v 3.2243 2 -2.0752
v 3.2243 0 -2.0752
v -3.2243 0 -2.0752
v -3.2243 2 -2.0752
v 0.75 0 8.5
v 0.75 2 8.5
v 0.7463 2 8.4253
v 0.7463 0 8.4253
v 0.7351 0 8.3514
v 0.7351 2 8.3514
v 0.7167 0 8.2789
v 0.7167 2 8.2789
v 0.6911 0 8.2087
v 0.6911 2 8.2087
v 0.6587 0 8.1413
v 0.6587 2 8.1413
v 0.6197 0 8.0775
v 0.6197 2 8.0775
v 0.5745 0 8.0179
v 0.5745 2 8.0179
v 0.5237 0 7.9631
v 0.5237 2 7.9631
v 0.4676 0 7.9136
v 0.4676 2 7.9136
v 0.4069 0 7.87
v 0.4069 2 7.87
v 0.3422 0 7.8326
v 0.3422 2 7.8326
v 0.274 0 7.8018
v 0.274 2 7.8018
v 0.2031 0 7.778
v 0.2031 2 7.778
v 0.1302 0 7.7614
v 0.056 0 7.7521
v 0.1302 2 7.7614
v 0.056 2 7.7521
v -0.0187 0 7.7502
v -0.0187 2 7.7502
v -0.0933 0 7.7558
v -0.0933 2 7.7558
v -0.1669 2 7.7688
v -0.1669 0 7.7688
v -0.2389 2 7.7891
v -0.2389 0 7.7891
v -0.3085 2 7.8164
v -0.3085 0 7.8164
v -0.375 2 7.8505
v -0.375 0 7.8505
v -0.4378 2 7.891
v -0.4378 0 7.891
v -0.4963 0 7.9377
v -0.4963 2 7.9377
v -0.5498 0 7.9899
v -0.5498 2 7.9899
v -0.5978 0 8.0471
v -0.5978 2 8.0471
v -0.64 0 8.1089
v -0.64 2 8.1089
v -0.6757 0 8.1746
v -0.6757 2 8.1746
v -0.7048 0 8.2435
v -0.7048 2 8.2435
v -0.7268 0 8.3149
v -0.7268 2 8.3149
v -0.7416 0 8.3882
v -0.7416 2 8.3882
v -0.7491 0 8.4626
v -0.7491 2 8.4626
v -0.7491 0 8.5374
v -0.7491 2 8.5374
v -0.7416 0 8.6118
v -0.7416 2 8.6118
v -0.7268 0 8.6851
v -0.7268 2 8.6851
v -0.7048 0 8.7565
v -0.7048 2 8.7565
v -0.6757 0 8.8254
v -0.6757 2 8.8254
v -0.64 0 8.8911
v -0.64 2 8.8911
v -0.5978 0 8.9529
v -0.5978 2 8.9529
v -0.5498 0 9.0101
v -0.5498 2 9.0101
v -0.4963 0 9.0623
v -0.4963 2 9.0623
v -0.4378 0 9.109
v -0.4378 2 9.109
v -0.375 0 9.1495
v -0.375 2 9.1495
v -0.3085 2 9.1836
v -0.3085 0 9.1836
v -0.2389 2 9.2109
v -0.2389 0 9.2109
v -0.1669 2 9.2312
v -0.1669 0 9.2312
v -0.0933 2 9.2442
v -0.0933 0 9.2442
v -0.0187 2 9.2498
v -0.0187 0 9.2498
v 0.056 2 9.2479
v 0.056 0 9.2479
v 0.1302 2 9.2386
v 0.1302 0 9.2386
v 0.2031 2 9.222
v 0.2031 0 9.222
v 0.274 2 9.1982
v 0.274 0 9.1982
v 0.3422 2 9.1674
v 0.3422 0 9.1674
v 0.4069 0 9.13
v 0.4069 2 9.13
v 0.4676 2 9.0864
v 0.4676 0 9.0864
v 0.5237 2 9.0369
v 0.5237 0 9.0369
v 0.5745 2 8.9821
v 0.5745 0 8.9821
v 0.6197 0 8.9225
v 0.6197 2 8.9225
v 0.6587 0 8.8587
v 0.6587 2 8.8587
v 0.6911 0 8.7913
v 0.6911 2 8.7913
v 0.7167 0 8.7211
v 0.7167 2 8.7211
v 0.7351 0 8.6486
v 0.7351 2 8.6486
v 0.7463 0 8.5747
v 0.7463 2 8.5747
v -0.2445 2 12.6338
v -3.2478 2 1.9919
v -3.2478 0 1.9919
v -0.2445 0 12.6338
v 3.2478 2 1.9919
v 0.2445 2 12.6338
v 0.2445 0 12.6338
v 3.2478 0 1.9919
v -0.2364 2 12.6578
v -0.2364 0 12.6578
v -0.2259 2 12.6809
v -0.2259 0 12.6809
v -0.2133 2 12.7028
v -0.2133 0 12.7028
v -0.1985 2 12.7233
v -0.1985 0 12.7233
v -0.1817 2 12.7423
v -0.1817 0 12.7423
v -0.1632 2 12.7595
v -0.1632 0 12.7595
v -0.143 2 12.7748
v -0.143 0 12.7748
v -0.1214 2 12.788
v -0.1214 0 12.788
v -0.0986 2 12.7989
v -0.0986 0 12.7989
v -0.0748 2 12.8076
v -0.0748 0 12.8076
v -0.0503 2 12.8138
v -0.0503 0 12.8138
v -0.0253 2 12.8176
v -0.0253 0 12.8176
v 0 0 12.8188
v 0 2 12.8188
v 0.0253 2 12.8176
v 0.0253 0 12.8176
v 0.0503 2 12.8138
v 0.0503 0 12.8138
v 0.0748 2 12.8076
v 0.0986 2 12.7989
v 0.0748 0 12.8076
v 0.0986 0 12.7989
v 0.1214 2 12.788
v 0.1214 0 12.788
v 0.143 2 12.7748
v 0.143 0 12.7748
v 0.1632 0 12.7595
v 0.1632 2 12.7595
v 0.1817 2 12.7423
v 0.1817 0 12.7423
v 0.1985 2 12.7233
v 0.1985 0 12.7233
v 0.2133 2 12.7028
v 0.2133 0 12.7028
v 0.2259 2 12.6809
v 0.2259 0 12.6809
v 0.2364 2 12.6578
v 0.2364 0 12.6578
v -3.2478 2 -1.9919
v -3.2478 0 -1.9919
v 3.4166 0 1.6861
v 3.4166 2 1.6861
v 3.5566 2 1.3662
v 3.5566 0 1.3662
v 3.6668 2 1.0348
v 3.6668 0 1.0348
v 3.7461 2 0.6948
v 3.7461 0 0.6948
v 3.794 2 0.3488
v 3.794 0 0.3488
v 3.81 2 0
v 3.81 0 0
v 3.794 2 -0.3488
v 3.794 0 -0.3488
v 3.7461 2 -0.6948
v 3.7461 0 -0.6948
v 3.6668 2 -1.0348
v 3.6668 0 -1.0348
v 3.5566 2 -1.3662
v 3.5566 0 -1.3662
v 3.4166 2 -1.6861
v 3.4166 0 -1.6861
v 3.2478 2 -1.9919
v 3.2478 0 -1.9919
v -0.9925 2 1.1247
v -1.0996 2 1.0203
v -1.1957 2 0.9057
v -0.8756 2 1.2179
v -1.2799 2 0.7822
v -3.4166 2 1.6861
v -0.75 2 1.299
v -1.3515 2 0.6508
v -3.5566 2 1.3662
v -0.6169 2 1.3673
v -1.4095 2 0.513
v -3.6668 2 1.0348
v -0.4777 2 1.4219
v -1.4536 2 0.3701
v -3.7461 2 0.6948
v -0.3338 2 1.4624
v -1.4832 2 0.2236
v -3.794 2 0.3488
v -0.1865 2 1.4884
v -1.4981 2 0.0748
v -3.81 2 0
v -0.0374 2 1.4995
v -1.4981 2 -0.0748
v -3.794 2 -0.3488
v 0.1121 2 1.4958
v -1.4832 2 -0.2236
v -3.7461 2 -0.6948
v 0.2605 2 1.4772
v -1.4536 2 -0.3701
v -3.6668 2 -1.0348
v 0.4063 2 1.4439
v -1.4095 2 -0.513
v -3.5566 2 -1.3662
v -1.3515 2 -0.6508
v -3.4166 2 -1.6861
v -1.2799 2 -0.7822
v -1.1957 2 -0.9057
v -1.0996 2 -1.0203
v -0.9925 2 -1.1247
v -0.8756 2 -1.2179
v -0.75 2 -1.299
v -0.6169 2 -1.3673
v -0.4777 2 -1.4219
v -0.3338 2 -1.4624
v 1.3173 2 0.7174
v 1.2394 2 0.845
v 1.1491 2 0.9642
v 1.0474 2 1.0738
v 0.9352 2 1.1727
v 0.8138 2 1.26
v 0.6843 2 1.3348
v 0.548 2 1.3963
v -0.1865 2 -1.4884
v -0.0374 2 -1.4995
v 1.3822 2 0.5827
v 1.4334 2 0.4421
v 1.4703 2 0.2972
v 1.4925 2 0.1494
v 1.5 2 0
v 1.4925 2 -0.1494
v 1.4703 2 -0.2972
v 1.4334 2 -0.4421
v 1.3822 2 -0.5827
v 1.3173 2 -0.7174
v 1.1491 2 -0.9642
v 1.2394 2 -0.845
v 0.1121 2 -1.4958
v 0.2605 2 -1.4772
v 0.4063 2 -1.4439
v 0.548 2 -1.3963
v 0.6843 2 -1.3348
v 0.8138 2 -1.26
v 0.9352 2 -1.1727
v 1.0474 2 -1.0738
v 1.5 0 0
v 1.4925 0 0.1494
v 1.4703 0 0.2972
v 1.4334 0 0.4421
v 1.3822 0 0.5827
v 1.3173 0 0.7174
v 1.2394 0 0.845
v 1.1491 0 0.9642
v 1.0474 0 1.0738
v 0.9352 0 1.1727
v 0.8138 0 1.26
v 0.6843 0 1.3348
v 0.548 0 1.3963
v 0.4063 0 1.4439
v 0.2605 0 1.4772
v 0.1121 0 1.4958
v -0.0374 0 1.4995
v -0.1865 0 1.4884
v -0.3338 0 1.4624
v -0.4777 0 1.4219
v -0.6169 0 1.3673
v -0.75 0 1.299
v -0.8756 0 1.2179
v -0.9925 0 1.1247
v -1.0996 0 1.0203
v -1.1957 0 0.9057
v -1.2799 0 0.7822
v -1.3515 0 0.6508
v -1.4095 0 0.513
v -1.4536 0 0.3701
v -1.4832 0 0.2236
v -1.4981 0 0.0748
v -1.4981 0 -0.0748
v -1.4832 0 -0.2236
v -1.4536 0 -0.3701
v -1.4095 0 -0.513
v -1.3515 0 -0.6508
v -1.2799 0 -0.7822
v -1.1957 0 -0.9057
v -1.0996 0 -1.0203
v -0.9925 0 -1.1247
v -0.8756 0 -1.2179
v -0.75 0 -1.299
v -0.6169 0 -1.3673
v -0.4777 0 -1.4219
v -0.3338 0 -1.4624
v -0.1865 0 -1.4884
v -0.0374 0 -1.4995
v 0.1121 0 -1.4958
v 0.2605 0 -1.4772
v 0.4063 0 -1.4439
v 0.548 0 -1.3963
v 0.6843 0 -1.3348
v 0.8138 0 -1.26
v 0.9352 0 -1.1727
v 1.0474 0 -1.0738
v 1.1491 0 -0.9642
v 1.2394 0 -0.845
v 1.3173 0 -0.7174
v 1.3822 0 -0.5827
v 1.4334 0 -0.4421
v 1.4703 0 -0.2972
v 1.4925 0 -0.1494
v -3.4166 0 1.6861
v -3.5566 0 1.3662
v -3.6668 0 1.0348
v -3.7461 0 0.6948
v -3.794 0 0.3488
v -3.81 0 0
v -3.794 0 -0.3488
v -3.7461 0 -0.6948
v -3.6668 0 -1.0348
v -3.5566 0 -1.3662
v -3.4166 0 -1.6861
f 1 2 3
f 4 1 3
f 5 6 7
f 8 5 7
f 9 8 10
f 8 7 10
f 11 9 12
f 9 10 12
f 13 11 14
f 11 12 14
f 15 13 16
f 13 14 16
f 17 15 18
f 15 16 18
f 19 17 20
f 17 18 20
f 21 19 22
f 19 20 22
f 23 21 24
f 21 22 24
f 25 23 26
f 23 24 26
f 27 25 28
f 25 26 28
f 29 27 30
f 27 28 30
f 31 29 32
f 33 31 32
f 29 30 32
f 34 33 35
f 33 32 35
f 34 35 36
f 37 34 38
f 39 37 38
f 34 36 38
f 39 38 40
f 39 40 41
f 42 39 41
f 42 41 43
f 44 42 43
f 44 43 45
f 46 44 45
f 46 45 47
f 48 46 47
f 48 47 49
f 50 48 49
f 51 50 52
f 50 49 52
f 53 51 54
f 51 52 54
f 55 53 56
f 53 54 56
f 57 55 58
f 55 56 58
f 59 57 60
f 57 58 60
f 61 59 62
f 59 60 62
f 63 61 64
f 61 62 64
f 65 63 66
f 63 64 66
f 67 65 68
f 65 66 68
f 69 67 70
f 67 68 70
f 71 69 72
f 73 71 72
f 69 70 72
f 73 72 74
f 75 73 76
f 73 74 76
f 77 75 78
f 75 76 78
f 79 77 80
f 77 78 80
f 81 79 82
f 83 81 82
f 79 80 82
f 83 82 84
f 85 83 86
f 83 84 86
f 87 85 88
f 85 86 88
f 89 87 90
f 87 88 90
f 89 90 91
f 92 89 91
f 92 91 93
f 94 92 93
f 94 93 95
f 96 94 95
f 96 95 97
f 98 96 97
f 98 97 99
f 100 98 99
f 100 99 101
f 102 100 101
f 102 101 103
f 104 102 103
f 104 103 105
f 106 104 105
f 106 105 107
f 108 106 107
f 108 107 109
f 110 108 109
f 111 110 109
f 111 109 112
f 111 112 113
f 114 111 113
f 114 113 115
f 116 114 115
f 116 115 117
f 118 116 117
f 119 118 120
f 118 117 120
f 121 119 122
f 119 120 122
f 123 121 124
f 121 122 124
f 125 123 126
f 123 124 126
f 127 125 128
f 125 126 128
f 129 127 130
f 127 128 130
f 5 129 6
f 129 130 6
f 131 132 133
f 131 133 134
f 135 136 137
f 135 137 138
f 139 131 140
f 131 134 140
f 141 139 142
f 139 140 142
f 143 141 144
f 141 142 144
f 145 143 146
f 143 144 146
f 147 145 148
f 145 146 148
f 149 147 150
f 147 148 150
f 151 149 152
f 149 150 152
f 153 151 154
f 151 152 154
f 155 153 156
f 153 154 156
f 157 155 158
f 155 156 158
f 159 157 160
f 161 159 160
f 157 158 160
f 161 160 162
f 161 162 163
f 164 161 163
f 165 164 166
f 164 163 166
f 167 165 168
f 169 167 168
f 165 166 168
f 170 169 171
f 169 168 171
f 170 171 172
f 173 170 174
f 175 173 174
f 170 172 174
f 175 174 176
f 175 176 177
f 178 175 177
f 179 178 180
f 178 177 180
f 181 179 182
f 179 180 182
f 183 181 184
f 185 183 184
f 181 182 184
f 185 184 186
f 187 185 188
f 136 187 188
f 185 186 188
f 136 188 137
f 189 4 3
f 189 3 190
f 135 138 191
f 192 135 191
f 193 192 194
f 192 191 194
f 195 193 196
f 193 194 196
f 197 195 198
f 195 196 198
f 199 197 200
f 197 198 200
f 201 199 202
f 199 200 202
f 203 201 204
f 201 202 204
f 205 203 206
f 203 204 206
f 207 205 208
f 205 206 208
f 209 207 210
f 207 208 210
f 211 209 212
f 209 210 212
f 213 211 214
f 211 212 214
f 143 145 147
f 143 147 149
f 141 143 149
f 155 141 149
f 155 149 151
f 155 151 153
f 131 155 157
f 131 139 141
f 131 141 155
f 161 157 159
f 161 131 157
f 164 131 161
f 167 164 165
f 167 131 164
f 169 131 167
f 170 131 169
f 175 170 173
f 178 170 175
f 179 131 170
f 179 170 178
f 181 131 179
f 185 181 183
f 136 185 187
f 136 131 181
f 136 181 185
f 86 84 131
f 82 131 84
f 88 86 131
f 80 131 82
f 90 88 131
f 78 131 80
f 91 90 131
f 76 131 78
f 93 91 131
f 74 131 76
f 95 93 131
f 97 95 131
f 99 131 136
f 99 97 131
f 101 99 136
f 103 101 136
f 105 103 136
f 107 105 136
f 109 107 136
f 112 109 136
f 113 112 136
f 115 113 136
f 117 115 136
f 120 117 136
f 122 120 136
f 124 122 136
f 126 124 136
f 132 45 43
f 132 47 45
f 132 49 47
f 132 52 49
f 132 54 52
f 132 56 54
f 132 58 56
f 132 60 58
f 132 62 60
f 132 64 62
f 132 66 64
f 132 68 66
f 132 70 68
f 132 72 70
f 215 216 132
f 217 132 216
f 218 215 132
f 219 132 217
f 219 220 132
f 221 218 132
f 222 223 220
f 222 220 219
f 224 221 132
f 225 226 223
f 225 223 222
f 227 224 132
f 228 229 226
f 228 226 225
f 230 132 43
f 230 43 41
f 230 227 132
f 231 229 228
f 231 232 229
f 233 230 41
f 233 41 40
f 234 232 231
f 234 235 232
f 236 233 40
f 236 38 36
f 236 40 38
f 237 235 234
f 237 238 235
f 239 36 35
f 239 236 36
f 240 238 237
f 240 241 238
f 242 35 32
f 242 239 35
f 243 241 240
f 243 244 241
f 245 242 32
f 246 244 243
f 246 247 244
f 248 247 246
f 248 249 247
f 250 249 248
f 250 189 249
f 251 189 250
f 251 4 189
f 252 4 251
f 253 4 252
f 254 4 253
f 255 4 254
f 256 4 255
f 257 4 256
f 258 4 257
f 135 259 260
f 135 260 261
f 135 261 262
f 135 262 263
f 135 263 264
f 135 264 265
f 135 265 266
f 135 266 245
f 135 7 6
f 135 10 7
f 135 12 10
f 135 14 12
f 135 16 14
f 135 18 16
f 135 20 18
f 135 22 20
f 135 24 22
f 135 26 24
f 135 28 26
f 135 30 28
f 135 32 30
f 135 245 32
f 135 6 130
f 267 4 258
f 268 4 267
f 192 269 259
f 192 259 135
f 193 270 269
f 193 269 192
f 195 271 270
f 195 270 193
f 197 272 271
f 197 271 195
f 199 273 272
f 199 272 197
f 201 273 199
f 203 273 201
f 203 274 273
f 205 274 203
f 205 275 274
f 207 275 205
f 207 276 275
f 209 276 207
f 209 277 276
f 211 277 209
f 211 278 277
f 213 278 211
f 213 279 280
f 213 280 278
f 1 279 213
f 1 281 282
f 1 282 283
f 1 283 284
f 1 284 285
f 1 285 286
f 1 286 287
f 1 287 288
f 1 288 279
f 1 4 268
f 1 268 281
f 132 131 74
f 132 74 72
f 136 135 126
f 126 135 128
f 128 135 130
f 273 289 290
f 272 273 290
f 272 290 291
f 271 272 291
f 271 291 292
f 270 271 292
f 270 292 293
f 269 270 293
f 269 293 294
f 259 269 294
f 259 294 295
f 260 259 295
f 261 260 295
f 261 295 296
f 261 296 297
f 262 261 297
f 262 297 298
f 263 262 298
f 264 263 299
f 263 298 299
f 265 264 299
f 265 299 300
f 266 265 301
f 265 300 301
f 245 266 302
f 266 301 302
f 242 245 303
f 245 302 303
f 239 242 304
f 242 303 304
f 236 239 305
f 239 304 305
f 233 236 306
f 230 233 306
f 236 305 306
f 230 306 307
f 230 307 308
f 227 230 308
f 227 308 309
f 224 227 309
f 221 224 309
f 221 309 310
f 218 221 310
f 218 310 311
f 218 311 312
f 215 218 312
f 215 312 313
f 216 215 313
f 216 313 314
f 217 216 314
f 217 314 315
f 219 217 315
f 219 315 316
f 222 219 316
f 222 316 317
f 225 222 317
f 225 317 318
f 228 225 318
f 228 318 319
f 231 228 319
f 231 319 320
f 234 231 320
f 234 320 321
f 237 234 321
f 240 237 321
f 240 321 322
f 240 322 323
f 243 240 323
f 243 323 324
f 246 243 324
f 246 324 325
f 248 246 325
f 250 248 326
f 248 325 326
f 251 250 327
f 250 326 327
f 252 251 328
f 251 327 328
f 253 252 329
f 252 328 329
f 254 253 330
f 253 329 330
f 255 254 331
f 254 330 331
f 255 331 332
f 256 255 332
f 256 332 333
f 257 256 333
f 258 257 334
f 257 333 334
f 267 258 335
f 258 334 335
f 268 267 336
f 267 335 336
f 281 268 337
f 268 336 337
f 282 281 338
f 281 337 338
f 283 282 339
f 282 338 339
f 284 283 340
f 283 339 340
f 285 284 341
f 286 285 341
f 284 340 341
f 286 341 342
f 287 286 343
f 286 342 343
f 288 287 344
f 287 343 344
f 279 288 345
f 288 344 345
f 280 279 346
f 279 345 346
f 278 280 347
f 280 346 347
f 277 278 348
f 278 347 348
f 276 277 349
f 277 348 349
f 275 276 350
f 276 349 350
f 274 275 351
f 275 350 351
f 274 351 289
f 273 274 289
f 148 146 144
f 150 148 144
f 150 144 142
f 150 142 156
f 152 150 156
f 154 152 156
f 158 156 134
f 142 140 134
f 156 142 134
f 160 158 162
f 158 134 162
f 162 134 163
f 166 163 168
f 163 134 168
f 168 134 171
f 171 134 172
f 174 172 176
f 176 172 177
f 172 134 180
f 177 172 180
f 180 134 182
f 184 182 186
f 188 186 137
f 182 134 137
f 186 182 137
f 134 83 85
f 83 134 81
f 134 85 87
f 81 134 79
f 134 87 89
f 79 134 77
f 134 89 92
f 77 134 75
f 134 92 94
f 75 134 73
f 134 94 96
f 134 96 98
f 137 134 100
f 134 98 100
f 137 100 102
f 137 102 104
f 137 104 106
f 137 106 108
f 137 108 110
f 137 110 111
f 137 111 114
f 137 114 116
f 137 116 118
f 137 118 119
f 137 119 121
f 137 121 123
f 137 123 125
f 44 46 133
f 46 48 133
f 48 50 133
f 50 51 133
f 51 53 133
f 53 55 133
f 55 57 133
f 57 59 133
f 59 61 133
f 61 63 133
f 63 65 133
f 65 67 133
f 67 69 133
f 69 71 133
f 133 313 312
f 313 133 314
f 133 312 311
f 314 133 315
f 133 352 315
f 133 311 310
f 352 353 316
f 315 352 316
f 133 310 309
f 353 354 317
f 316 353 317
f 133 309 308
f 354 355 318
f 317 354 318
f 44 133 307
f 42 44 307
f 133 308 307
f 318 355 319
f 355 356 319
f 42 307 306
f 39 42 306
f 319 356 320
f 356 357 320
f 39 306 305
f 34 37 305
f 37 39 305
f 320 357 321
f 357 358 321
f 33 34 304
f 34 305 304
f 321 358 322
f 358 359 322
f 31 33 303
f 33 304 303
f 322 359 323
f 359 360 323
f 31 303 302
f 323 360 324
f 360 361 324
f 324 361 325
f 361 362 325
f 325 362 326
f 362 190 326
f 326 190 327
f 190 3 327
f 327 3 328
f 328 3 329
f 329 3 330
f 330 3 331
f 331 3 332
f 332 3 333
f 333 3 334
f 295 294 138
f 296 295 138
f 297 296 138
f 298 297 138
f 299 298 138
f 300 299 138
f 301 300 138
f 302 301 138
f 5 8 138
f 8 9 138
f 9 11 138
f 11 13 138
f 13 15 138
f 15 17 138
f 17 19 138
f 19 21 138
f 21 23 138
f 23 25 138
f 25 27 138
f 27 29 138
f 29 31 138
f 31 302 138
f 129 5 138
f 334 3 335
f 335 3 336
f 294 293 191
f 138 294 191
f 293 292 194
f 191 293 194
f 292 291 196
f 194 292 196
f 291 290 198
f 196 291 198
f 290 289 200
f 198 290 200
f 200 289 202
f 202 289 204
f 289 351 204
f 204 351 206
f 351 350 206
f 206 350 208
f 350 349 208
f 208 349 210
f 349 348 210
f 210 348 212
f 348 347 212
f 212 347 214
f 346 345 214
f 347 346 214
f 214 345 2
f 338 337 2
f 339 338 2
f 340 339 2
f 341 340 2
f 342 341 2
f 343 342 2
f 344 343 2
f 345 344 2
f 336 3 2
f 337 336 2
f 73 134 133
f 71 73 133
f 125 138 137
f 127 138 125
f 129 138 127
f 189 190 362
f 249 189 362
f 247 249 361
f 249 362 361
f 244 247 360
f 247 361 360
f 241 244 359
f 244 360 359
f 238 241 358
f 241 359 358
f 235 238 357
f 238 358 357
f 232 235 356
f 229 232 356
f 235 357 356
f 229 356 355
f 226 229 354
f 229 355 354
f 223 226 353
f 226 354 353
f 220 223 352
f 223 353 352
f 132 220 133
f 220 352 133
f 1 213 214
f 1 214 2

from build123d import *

# Parameters (mm, degrees)
SKETCH1_R           = 3.81
BOSS_EXTRUDE1_DEPTH = 2
BOSS_EXTRUDE2_DEPTH = 2
FILLET1_R           = 0.254
SKETCH3_R           = 0.75
CUT_EXTRUDE1_DEPTH  = 2
SKETCH4_R           = 1.5
CUT_EXTRUDE2_DEPTH  = 3
CUT_EXTRUDE3_DEPTH  = 2.54


with BuildPart() as part:
    # Sketch1 → Boss-Extrude1 (new body)
    with BuildSketch(Plane(origin=(0, 0, 0), x_dir=(1, 0, 0), z_dir=(0, 1, 0))):
        Circle(SKETCH1_R)
    extrude(amount=BOSS_EXTRUDE1_DEPTH)

    # Sketch2 → Boss-Extrude2 (add)
    with BuildSketch(Plane(origin=(0, 2, 0), x_dir=(1, 0, 0), z_dir=(0, 1, 0))):
        with BuildLine():
            Line((0, -13.5), (3.247846855, -1.991881223))
            ThreePointArc((3.247846855, -1.991881223), (0, -3.81), (-3.247846855, -1.991881223))
            Line((-3.247846855, -1.991881223), (0, -13.5))
        make_face()
        with BuildLine():
            ThreePointArc((-3.247846855, 1.991881223), (0, 3.81), (3.247846855, 1.991881223))
            Line((3.247846855, 1.991881223), (0, 13.5))
            Line((0, 13.5), (-3.247846855, 1.991881223))
        make_face()
    extrude(amount=-BOSS_EXTRUDE2_DEPTH)

    # Fillet1
    fillet1_edges = [part.edges().sort_by_distance(p)[0] for p in [
        (0, 1, -13.5),
        (0, 1, 13.5),
    ]]
    fillet(fillet1_edges, radius=FILLET1_R)

    # Sketch3 → Cut-Extrude1 (cut)
    with BuildSketch(Plane(origin=(0, 2, 0), x_dir=(1, 0, 0), z_dir=(0, 1, 0))):
        with Locations((0, 8.5)):
            Circle(SKETCH3_R)
        with Locations((0, -8.5)):
            Circle(SKETCH3_R)
    extrude(amount=-CUT_EXTRUDE1_DEPTH, mode=Mode.SUBTRACT)

    # Sketch4 → Cut-Extrude2 (cut, through all)
    with BuildSketch(Plane.XZ):
        Circle(SKETCH4_R)
    extrude(amount=-CUT_EXTRUDE2_DEPTH, mode=Mode.SUBTRACT)

    # Sketch5 → Cut-Extrude3 (cut)
    with BuildSketch(Plane(origin=(0, 0, 0), x_dir=(1, 0, 0), z_dir=(0, 1, 0))):
        Polygon((5.430650193, 2.075218265), (-5.917689048, 2.075218265), (-5.917689048, 14.831745587), (0, 14.831745587), (5.430650193, 14.831745587), align=None)
    extrude(amount=CUT_EXTRUDE3_DEPTH, mode=Mode.SUBTRACT)


solid = part.part
